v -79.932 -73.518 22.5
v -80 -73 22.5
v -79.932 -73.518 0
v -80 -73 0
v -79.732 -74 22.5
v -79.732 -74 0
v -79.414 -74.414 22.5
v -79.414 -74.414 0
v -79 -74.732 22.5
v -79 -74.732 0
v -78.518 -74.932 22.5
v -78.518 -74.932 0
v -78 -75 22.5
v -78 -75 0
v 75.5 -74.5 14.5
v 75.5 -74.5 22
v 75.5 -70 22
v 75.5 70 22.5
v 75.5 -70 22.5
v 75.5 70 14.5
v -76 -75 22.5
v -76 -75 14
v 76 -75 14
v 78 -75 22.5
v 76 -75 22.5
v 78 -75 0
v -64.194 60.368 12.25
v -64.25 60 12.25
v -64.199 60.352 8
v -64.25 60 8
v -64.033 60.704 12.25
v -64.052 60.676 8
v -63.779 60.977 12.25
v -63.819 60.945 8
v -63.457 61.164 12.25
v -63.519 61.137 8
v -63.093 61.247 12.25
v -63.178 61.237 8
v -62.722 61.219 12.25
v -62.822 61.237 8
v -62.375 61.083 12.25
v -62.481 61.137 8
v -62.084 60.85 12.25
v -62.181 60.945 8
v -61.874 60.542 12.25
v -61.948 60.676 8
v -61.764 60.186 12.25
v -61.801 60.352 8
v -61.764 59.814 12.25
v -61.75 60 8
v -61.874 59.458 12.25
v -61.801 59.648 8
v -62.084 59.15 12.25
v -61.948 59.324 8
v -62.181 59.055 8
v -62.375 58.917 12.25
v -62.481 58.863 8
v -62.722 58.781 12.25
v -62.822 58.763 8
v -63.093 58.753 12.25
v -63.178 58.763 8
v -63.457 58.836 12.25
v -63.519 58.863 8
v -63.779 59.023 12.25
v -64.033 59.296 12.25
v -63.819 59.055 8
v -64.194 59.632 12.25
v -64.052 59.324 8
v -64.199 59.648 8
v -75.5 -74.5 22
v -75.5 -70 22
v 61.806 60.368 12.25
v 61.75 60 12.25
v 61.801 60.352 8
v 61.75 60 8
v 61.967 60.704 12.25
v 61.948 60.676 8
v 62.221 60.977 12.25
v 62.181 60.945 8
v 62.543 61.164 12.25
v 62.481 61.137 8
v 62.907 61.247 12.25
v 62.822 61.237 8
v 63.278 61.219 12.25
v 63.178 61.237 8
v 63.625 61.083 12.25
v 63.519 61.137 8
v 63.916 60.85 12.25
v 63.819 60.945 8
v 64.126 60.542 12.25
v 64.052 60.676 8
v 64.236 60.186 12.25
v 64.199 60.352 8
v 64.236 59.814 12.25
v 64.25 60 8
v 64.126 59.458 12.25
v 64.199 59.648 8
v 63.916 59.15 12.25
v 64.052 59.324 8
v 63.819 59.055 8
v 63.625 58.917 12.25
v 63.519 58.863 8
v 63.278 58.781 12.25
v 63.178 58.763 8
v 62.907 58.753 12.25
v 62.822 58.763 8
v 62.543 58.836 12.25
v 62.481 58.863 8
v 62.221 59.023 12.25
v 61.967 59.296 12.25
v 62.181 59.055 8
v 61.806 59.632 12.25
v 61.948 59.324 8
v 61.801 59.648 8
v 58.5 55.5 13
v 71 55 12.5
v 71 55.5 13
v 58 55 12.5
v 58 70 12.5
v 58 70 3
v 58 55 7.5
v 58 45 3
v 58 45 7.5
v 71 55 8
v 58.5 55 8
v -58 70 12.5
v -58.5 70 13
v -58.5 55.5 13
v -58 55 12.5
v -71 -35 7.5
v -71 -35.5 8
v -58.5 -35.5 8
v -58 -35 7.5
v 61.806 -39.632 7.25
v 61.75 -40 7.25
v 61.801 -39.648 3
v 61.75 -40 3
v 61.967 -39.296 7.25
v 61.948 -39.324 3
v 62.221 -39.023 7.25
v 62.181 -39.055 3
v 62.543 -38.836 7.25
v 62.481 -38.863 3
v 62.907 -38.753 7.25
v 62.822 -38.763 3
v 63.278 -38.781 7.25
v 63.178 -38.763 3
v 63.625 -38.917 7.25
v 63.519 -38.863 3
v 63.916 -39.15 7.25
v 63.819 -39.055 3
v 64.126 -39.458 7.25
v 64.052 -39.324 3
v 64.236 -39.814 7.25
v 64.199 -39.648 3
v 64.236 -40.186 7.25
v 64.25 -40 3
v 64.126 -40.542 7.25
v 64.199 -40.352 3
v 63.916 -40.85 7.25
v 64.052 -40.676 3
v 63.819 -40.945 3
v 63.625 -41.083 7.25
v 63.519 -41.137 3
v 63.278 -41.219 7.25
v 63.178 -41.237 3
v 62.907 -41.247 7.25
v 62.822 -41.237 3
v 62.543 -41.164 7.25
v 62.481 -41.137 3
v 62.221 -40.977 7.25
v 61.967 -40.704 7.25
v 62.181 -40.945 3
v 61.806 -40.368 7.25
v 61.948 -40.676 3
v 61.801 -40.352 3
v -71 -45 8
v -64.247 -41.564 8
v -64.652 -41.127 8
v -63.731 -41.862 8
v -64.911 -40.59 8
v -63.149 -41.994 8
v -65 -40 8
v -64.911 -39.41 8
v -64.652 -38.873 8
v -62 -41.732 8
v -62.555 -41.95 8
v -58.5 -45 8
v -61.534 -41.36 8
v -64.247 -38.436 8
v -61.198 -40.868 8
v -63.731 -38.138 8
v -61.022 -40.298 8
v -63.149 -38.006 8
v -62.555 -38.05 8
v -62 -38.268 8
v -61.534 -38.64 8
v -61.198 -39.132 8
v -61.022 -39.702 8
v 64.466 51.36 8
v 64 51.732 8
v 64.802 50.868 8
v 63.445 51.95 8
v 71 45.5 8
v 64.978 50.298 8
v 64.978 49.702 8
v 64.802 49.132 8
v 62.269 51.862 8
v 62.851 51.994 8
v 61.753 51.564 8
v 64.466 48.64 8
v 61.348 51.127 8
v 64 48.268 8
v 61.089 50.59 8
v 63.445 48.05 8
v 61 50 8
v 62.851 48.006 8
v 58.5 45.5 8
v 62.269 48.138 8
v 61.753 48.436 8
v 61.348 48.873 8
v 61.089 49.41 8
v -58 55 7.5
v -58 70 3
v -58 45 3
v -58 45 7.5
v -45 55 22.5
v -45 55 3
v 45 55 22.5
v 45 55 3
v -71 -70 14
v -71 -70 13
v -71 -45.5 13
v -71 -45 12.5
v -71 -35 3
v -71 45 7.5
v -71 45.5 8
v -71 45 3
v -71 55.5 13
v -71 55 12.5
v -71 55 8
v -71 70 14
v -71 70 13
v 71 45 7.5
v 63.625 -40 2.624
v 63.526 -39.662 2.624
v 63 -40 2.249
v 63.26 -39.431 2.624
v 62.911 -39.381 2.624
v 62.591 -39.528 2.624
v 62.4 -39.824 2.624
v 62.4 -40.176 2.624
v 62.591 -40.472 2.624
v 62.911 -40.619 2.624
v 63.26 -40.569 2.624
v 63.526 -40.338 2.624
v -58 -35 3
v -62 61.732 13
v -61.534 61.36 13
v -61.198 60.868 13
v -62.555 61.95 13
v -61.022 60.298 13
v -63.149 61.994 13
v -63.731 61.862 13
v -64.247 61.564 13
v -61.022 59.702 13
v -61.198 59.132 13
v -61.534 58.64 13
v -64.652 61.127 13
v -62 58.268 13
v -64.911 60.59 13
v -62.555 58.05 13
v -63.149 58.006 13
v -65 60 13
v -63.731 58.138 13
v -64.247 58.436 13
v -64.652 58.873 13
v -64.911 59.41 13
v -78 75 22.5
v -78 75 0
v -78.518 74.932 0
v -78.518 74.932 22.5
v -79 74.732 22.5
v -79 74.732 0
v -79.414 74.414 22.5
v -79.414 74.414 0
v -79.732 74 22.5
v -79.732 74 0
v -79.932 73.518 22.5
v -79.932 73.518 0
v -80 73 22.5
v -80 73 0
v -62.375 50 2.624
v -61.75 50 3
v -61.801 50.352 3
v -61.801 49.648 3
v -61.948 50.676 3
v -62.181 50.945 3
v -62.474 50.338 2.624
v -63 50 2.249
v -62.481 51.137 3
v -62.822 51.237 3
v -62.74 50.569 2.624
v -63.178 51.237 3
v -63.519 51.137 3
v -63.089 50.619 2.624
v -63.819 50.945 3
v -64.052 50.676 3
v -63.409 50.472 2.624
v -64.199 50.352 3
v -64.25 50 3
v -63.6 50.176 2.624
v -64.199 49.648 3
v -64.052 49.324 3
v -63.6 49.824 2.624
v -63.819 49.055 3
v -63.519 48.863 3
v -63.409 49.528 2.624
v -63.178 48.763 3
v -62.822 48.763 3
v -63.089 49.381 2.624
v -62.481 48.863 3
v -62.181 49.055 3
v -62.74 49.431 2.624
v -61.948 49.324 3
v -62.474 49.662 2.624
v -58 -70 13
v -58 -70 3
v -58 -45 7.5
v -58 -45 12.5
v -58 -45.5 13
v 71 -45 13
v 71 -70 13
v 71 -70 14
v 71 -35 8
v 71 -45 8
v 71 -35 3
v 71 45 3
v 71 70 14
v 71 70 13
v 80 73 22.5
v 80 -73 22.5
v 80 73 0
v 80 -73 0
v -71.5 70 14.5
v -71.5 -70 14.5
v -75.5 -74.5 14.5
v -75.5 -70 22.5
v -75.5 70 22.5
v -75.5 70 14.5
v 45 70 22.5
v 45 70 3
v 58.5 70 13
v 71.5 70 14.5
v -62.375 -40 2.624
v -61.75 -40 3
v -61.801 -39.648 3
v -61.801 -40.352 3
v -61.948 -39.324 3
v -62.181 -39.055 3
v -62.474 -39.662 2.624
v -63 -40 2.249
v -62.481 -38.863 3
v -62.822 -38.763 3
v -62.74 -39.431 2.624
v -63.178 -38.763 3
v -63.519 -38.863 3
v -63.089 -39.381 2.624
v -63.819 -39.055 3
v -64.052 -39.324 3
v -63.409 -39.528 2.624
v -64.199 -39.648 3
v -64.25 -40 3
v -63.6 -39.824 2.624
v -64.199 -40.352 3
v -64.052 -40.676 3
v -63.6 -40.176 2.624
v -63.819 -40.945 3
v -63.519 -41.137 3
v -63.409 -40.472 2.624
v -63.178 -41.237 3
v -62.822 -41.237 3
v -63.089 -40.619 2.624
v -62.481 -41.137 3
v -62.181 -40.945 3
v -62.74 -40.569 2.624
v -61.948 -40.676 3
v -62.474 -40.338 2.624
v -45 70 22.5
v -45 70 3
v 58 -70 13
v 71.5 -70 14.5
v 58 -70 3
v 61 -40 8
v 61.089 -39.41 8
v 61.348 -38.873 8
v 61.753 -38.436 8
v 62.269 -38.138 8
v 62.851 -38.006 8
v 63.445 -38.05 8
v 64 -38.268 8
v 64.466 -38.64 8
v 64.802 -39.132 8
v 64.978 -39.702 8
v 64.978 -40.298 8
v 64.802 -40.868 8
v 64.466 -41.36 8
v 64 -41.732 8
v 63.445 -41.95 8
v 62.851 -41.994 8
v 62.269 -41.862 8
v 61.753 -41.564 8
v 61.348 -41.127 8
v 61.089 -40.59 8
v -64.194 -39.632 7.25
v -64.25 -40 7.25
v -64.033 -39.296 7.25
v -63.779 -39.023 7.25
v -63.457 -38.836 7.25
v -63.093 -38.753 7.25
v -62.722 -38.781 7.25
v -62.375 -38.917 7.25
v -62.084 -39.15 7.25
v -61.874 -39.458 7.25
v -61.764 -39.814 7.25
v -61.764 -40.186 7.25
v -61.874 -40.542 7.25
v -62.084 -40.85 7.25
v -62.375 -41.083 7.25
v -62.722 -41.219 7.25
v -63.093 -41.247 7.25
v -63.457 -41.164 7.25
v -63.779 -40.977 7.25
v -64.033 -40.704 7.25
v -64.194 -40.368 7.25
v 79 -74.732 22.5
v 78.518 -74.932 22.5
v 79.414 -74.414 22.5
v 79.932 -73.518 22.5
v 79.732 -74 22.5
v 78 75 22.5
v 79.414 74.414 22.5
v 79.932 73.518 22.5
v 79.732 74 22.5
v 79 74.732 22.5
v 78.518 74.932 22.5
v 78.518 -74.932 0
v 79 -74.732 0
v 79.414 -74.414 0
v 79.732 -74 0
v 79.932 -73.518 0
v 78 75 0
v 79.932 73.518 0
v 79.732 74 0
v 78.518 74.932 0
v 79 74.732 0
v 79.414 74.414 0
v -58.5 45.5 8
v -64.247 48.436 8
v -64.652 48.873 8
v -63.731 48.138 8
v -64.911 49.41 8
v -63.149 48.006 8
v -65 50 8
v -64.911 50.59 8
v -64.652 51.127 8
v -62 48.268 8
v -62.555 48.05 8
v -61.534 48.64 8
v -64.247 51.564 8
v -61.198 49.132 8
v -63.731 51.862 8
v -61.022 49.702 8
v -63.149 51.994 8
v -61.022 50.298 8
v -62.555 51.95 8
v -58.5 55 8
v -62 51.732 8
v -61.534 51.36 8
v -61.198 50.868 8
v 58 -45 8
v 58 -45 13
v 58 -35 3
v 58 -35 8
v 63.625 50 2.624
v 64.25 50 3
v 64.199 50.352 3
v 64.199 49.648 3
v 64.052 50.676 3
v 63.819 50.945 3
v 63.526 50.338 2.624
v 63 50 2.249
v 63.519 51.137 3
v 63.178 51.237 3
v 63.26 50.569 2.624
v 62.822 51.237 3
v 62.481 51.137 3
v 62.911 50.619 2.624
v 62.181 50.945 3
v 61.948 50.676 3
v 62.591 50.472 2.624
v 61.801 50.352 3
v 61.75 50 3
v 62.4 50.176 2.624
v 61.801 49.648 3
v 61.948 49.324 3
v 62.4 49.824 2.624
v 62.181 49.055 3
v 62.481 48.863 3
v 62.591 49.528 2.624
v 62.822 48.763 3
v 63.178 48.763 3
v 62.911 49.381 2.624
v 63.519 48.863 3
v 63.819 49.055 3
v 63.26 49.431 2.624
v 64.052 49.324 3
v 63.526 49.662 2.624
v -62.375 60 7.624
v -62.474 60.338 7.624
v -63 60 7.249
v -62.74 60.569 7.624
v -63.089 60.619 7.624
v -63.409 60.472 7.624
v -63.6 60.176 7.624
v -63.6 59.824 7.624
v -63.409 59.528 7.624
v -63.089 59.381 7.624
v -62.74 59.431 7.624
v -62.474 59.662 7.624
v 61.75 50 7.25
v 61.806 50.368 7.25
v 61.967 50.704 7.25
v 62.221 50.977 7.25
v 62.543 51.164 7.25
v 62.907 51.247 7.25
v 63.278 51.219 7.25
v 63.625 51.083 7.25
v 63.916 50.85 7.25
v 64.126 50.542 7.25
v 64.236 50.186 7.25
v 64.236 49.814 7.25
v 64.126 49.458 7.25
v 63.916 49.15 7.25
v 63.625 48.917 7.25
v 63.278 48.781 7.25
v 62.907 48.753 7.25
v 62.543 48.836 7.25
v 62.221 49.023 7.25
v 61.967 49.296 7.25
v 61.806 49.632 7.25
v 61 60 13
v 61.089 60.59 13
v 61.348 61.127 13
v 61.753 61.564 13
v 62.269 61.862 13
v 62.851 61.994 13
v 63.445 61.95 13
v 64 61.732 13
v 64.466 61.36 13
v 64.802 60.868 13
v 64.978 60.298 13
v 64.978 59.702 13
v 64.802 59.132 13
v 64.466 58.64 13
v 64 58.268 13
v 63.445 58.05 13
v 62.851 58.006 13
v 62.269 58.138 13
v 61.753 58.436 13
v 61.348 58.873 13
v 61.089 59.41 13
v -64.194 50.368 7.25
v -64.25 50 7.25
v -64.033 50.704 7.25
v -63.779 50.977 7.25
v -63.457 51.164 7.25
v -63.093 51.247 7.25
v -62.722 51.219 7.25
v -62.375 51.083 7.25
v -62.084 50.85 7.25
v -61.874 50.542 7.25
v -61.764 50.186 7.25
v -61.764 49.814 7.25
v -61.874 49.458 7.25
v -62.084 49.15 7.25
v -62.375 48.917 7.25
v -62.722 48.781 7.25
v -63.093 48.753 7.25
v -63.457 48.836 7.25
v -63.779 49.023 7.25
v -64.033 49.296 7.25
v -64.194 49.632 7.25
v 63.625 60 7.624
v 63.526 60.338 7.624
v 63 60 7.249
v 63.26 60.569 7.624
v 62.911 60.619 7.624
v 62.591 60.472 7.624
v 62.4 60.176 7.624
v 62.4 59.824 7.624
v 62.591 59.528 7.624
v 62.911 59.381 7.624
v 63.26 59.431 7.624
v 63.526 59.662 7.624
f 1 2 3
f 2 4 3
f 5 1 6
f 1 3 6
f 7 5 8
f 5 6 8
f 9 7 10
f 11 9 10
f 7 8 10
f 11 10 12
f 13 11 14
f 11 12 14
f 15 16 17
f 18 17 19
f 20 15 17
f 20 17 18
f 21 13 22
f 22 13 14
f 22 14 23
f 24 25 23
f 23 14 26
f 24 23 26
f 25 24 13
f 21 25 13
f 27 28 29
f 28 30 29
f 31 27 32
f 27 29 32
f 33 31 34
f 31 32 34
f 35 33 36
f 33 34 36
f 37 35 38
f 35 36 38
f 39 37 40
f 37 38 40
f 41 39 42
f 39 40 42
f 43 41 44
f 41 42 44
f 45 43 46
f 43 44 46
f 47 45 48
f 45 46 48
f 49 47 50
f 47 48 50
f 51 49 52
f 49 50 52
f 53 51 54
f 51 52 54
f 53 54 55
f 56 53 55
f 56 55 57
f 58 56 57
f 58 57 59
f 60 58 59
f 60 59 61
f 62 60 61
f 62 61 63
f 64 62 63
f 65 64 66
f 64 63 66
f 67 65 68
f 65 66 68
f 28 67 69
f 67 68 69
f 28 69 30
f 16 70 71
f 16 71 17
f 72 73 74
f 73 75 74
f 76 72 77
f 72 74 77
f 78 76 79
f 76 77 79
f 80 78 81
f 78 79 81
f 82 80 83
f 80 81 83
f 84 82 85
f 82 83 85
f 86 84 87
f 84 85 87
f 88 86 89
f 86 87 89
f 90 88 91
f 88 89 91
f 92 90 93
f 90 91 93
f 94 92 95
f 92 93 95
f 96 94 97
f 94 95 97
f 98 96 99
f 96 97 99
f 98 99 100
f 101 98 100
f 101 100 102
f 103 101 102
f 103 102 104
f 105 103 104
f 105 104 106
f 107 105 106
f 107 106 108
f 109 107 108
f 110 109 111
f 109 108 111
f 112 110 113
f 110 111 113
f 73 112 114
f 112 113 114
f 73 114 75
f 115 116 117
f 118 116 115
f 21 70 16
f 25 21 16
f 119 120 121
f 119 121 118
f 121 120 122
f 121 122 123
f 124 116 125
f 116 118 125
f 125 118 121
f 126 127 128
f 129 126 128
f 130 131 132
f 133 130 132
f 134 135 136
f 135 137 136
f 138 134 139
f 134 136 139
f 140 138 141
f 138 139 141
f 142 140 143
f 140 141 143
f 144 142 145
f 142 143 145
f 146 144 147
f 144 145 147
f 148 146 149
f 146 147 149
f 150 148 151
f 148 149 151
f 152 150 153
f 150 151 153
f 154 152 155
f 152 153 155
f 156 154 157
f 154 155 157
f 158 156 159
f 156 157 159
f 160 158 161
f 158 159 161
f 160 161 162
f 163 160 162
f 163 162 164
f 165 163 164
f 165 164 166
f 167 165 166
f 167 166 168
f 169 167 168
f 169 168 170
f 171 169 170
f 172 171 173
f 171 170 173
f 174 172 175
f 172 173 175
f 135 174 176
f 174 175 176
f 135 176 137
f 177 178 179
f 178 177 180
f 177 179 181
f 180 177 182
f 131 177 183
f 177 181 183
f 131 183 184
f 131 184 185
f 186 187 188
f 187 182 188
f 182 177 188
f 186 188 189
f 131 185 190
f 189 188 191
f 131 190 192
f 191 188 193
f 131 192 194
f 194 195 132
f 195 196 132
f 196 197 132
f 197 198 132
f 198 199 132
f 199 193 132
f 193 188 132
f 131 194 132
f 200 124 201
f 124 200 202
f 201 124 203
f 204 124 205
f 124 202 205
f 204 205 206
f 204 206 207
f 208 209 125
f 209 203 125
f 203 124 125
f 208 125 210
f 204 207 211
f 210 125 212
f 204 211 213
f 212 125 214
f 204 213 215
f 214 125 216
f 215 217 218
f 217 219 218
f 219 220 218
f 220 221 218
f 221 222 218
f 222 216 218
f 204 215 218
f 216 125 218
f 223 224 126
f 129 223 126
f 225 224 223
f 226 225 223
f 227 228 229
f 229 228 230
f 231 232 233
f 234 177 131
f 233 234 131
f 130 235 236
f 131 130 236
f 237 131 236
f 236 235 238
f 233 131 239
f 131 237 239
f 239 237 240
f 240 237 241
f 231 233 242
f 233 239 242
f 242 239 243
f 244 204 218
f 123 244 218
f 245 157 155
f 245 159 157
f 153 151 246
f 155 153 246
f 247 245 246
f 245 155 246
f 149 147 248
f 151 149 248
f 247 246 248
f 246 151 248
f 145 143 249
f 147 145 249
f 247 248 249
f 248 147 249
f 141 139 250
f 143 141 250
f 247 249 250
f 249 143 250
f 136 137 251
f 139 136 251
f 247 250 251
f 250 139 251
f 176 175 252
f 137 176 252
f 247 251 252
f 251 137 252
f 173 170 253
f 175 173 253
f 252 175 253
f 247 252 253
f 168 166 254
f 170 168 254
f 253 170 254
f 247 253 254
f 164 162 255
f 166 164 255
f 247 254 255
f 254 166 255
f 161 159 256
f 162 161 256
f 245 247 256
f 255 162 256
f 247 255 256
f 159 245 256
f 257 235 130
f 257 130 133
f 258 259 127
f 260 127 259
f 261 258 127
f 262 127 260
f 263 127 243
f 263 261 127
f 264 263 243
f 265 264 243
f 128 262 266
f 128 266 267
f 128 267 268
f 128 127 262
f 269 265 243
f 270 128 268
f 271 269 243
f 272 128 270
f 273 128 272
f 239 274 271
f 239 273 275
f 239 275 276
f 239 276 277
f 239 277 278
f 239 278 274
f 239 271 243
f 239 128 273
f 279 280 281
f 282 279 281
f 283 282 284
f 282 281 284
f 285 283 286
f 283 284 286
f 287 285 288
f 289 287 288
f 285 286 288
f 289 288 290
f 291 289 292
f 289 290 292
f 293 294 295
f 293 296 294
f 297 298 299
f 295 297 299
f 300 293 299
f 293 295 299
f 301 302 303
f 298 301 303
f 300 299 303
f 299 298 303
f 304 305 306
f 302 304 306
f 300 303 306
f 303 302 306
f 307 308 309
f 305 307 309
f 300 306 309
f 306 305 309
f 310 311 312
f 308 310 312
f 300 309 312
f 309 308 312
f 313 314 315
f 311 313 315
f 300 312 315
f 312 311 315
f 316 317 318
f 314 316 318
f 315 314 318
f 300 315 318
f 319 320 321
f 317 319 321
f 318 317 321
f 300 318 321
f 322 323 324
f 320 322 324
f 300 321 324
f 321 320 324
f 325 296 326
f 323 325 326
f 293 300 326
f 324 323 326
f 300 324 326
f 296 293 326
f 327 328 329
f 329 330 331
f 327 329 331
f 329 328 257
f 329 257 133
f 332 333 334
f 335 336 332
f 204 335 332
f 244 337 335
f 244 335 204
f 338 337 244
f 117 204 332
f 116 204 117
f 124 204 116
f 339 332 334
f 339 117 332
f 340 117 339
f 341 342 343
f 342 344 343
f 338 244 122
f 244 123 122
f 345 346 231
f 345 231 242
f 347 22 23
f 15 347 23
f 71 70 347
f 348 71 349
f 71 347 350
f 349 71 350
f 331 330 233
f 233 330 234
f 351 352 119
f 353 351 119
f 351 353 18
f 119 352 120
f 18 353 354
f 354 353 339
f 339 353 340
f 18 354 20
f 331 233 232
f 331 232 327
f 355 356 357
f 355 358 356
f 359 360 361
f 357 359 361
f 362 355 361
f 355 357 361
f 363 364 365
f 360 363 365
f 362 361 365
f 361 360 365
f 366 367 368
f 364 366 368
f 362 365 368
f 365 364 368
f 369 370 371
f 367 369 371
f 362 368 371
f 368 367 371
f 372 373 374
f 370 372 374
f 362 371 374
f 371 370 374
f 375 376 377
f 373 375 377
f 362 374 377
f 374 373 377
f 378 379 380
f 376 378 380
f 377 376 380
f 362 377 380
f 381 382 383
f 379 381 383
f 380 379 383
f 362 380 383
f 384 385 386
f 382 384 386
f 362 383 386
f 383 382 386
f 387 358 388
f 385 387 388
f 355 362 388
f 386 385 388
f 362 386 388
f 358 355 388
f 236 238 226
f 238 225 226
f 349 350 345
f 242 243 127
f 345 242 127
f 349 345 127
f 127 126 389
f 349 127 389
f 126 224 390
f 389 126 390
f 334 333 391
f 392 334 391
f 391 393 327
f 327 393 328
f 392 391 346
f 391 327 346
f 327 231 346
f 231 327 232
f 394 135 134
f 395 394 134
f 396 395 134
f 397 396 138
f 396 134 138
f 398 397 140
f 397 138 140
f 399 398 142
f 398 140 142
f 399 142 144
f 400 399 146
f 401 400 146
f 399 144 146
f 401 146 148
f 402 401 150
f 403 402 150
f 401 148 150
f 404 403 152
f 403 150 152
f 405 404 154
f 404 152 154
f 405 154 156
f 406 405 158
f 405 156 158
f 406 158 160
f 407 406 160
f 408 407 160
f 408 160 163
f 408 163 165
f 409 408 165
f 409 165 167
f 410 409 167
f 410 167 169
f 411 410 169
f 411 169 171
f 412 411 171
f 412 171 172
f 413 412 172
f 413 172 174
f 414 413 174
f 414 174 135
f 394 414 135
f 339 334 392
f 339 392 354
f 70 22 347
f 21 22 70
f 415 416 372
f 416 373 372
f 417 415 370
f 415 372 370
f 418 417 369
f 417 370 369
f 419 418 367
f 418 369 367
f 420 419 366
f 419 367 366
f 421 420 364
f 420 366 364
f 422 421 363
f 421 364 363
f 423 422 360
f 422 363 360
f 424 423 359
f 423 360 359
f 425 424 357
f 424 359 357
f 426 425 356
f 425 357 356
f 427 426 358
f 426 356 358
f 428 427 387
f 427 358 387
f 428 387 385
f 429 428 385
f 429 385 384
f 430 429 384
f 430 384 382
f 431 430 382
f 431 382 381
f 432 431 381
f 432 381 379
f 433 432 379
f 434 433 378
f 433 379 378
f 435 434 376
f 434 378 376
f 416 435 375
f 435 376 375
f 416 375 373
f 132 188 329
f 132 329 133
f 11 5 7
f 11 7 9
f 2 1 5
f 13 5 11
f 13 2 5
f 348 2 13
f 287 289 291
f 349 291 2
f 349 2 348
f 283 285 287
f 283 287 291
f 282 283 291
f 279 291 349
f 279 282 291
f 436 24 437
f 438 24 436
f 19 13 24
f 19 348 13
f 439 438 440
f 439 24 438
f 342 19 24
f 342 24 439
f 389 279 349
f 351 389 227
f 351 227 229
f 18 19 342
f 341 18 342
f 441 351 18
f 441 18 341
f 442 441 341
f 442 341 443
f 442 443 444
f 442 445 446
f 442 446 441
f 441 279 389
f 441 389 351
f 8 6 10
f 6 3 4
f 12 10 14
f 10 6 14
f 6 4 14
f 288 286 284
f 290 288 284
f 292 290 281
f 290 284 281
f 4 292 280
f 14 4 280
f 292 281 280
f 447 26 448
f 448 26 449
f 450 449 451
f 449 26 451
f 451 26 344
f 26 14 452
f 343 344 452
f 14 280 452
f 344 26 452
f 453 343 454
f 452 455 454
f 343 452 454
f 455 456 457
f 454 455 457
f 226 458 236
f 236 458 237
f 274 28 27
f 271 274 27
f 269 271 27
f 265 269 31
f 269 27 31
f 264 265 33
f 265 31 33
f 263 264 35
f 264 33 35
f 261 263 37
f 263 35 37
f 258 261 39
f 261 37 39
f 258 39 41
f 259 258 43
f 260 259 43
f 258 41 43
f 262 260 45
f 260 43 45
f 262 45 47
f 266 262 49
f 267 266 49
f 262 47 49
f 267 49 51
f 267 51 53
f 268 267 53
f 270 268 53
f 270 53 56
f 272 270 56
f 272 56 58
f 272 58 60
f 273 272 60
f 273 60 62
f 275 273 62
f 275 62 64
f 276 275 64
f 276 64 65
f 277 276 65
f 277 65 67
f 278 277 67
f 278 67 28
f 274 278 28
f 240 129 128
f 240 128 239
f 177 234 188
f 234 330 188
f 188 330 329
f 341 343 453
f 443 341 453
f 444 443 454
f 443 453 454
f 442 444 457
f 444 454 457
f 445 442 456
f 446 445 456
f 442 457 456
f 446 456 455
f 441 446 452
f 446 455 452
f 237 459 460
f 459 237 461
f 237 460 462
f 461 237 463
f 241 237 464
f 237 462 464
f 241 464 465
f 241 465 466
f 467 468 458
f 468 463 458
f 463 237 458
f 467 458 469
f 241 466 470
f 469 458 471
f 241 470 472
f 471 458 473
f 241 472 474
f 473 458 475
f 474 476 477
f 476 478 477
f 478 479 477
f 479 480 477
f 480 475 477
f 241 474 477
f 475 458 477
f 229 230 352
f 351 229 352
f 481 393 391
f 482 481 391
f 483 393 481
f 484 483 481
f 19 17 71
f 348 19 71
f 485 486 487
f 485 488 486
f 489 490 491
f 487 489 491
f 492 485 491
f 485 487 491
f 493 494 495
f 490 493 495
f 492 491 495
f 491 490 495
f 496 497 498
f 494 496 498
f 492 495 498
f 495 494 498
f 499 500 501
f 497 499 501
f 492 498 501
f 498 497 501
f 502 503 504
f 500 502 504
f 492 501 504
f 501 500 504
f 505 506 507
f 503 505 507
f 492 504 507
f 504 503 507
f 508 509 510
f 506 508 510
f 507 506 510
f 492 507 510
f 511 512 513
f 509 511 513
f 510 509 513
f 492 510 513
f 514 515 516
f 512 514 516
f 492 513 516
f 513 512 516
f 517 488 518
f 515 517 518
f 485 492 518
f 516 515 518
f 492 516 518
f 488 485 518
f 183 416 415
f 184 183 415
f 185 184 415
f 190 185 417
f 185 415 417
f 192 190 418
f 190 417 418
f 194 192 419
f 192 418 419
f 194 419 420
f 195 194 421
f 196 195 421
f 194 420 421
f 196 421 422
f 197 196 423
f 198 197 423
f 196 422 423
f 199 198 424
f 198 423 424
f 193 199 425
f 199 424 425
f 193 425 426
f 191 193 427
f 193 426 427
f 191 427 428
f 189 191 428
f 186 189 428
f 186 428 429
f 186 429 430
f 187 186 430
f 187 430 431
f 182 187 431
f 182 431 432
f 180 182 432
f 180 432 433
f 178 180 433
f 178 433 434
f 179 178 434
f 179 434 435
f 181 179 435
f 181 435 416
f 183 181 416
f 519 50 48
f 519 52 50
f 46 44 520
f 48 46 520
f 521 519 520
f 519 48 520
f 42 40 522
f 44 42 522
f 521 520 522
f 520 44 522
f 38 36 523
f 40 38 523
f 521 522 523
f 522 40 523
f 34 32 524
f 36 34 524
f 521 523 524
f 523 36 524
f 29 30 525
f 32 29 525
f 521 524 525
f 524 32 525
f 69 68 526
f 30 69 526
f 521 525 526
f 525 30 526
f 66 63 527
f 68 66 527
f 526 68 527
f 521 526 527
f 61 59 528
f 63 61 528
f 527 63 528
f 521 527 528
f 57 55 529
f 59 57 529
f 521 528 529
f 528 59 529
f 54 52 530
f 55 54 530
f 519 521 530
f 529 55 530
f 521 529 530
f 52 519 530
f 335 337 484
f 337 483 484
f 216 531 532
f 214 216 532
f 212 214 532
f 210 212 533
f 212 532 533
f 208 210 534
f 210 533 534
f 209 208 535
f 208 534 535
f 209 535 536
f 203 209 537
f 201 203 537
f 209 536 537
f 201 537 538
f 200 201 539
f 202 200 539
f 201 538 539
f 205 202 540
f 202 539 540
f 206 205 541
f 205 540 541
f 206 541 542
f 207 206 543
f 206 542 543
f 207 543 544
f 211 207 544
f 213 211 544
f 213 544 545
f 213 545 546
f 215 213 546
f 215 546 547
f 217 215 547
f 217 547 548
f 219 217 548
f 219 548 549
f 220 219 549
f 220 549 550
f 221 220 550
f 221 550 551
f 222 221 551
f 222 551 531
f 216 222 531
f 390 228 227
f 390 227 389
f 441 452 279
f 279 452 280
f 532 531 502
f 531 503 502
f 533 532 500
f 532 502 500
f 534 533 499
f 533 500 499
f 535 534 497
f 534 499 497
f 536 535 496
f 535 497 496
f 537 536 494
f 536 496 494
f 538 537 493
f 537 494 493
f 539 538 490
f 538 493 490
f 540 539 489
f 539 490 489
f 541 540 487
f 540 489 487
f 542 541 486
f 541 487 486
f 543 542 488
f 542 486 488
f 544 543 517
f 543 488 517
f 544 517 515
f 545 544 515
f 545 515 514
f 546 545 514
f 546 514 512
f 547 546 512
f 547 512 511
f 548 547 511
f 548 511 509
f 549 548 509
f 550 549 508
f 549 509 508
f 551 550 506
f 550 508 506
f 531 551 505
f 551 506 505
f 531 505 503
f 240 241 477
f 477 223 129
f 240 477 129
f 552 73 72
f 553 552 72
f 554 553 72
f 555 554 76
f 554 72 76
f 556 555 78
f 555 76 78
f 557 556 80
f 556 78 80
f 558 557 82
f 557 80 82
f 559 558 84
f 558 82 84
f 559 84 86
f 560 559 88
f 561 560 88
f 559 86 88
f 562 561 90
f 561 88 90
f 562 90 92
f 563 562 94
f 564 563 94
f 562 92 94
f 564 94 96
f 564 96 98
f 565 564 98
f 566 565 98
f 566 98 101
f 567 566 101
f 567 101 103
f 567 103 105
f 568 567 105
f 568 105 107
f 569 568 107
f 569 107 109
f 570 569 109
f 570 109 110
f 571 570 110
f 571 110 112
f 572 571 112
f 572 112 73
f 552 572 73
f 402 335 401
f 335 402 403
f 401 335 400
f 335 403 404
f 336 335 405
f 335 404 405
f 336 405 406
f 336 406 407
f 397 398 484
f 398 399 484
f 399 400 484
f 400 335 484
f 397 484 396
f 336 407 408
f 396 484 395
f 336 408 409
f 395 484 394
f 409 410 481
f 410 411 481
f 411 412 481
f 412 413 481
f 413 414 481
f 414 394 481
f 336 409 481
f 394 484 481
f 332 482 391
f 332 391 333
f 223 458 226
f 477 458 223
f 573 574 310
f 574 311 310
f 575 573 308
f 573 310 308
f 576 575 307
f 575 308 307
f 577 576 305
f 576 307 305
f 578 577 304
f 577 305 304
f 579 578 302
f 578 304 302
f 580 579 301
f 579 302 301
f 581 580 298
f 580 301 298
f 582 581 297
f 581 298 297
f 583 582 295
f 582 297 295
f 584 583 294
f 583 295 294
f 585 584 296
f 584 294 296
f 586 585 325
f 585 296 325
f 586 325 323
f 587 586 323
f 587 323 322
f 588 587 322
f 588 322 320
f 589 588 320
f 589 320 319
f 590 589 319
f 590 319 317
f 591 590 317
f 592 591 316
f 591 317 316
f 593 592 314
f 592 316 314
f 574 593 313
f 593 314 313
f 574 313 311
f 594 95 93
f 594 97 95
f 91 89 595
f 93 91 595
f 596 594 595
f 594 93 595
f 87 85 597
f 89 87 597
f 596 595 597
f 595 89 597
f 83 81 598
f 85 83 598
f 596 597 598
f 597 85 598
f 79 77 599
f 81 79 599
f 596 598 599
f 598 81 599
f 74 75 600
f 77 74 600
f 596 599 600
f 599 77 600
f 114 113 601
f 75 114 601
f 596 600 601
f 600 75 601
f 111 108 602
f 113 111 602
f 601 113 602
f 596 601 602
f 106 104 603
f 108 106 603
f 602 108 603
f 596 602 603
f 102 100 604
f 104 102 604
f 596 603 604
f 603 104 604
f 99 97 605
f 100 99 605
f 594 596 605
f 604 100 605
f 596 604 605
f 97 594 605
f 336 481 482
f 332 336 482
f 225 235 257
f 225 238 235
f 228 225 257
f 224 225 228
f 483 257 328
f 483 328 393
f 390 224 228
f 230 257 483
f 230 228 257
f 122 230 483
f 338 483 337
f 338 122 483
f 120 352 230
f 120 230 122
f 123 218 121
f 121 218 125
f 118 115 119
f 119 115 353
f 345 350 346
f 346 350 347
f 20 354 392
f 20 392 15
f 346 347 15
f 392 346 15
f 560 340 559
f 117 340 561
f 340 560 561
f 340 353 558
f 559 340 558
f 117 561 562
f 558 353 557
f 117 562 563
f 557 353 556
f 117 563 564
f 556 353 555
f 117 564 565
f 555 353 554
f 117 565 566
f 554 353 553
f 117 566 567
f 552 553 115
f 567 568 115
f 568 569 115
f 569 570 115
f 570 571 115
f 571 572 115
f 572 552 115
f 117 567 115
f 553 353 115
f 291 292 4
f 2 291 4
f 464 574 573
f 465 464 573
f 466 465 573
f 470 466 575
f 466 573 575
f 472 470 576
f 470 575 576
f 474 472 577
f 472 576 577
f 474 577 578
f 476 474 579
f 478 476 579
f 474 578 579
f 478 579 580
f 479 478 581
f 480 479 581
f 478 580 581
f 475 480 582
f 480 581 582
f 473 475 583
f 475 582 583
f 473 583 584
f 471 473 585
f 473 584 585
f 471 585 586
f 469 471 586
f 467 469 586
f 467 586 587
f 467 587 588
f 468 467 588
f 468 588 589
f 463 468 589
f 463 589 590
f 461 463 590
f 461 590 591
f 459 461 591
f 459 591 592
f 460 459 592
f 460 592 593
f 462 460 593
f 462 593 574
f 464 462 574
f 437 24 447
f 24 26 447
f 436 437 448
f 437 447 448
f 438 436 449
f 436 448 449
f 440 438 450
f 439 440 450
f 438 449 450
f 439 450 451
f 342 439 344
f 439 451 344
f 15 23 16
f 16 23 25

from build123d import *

# Parameters (mm, degrees)
F1_DEPTH             = 3
F2_W                 = 10
F2_H                 = 10
F3_DEPTH             = 5
F5_W                 = 10
F5_H                 = 10
F6_DEPTH             = 10
F8_D                 = 2.5
F8_DEPTH             = 5
F8_CSINK_D           = 4
F8_CSINK_ANGLE       = 90
F8_TIP               = 0.7510757738
F8_ON_F4_D           = 2.5
F8_ON_F4_DEPTH       = 5
F8_ON_F4_CSINK_D     = 4
F8_ON_F4_CSINK_ANGLE = 90
F8_ON_F4_TIP         = 0.7510757738
F9_W                 = 9
F9_H                 = 140
F10_DEPTH            = 11.5
F11_W                = 4.5
F11_H                = 140
F12_DEPTH            = 8
F14_DEPTH            = 19.5
F15_W                = 151
F15_H                = 7.5
F16_DEPTH            = 5
F18_DEPTH            = 3
F19_W                = 13
F19_H                = 10
F19_W_2              = 10
F20_DEPTH            = 5
F22_DEPTH            = 3
F23_W                = 13
F23_H                = 10
F24_DEPTH            = 15
F25_W                = 90
F25_H                = 15
F26_DEPTH            = 19.5
F27_SIZE             = 0.49999


# Not quite as in the source:
# - a fillet or chamfer is up to 0.001 mm smaller than in the source, because OpenCascade refuses the exact size
# - a feature names something its author has since deleted; it is built from what else it names


with BuildPart() as f1:
    # F0 (on Top) → F1 (new body)
    with BuildSketch(Plane.XY):
        with BuildLine():
            Line((-78, -75), (78, -75))
            ThreePointArc((78, -75), (79.4142135624, -74.4142135624), (80, -73))
            Line((80, -73), (80, 73))
            ThreePointArc((80, 73), (79.4142135624, 74.4142135624), (78, 75))
            Line((78, 75), (-78, 75))
            ThreePointArc((-78, 75), (-79.4142135624, 74.4142135624), (-80, 73))
            Line((-80, 73), (-80, -73))
            ThreePointArc((-80, -73), (-79.4142135624, -74.4142135624), (-78, -75))
        make_face()
    extrude(amount=F1_DEPTH)

    # F2 (on face) → F3 (join)
    with BuildSketch(Plane.XY.offset(3)):
        with Locations((-63, -40)):
            Rectangle(F2_W, F2_H)
        with Locations((-63, 50)):
            Rectangle(F2_W, F2_H)
        with Locations((63, 50)):
            Rectangle(F2_W, F2_H)
        with Locations((63, -40)):
            Rectangle(F2_W, F2_H)
    extrude(amount=F3_DEPTH)

    # F5 (on face) → F6 (join)
    with BuildSketch(Plane.XY.offset(3)):
        with Locations((-63, 60)):
            Rectangle(F5_W, F5_H)
        with Locations((-63, -50)):
            Rectangle(F5_W, F5_H)
        with Locations((63, 60)):
            Rectangle(F5_W, F5_H)
        with Locations((63, -50)):
            Rectangle(F5_W, F5_H)
    extrude(amount=F6_DEPTH)

    # F8
    with Locations(Plane.XY.offset(13)):
        with Locations((-63, 60), (63, 60)):
            CounterSinkHole(F8_D / 2, F8_CSINK_D / 2, depth=F8_DEPTH, counter_sink_angle=F8_CSINK_ANGLE)
            with Locations((0, 0, -(F8_DEPTH + F8_TIP / 2))):  # 118° drill point
                Cone(0, F8_D / 2, F8_TIP, mode=Mode.SUBTRACT)

    # F8 on F4
    with Locations(Plane.XY.offset(8)):
        with Locations((-63, -40), (63, -40), (-63, 50), (63, 50)):
            CounterSinkHole(F8_ON_F4_D / 2, F8_ON_F4_CSINK_D / 2, depth=F8_ON_F4_DEPTH, counter_sink_angle=F8_ON_F4_CSINK_ANGLE)
            with Locations((0, 0, -(F8_ON_F4_DEPTH + F8_ON_F4_TIP / 2))):  # 118° drill point
                Cone(0, F8_ON_F4_D / 2, F8_ON_F4_TIP, mode=Mode.SUBTRACT)

    # F9 (on face) → F10 (join)
    with BuildSketch(Plane.XY.offset(3)):
        with Locations((-75.5, 0)):
            Rectangle(F9_W, F9_H)
        with Locations((75.5, 0)):
            Rectangle(F9_W, F9_H)
    extrude(amount=F10_DEPTH)

    # F11 (on face) → F12 (join)
    with BuildSketch(Plane.XY.offset(14.5)):
        with Locations((-77.75, 0)):
            Rectangle(F11_W, F11_H)
        with Locations((77.75, 0)):
            Rectangle(F11_W, F11_H)
    extrude(amount=F12_DEPTH)

    # F13 (on face) → F14 (join, through all)
    with BuildSketch(Plane.XY.offset(3)):
        with BuildLine():
            Line((-80, -70), (-80, -73))
            ThreePointArc((-80, -73), (-79.4142135624, -74.4142135624), (-78, -75))
            Line((-78, -75), (78, -75))
            ThreePointArc((78, -75), (79.4142135624, -74.4142135624), (80, -73))
            Line((80, -73), (80, -70))
            Line((80, -70), (-80, -70))
        make_face()
        with BuildLine():
            Line((-80, 73), (-80, 70))
            Line((-80, 70), (80, 70))
            Line((80, 70), (80, 73))
            ThreePointArc((80, 73), (79.4142135624, 74.4142135624), (78, 75))
            Line((78, 75), (-78, 75))
            ThreePointArc((-78, 75), (-79.4142135624, 74.4142135624), (-80, 73))
        make_face()
    extrude(amount=F14_DEPTH)

    # F15 (on face) → F16 (cut, through all)
    with BuildSketch(Plane.XZ.offset(75)):
        with Locations((0, 18.25)):
            Rectangle(F15_W, F15_H)
    extrude(amount=-F16_DEPTH, mode=Mode.SUBTRACT)

    # F17 (on face) → F18 (join, through all)
    with BuildSketch(Plane(origin=(-68, 0, 0), x_dir=(0, -1, 0), z_dir=(-1, 0, 0))):
        Polygon((-65, 3), (-45, 3), (-45, 8), (-55, 8), (-55, 13), (-65, 13), align=None)
        Polygon((35, 3), (55, 3), (55, 13), (45, 13), (45, 8), (35, 8), align=None)
    extrude(amount=F18_DEPTH)

    # F19 (on face) → F20 (join, through all)
    with BuildSketch(Plane(origin=(0, 65, 0), x_dir=(-1, 0, 0), z_dir=(0, 1, 0))):
        with Locations((64.5, 8)):
            Rectangle(F19_W, F19_H)
        with Locations((-63, 8)):
            Rectangle(F19_W_2, F19_H)
    extrude(amount=F20_DEPTH)

    # F21 (on face) → F22 (join, through all)
    with BuildSketch(Plane.YZ.offset(68)):
        Polygon((45, 8), (45, 3), (70, 3), (70, 13), (55, 13), (55, 8), align=None)
        Polygon((-55, 13), (-55, 3), (-35, 3), (-35, 8), (-45, 8), (-45, 13), align=None)
    extrude(amount=F22_DEPTH)

    # F23 (on face) → F24 (join, through all)
    with BuildSketch(Plane.XZ.offset(55)):
        with Locations((64.5, 8)):
            Rectangle(F23_W, F23_H)
        with Locations((-64.5, 8)):
            Rectangle(F23_W, F23_H)
    extrude(amount=F24_DEPTH)

    # F25 (on face) → F26 (join, through all)
    with BuildSketch(Plane.XY.offset(3)):
        with Locations((0, 62.5)):
            Rectangle(F25_W, F25_H)
    extrude(amount=F26_DEPTH)

    # F27 (size 0.5 in the source; OpenCascade refuses exactly that, so slightly less here)
    f27_edges = [f1.edges().sort_by_distance(p)[0] for p in [
        (71, 0, 14.5),
        (-71, 0, 14.5),
        (-58, 62.5, 13),
        (-64.5, 55, 13),
        (-58, 50, 8),
        (-64.5, 45, 8),
        (-64.5, -45, 13),
        (-58, -40, 8),
        (-64.5, -35, 8),
        (58, 62.5, 13),
        (64.5, 55, 13),
        (58, 50, 8),
        (64.5, 45, 8),
        (-75.5, -75, 18.25),
        (0, -75, 14.5),
        (0, -75, 22),
        (75.5, -75, 18.25),
    ]]
    chamfer(f27_edges, length=F27_SIZE)


solid = f1.part
